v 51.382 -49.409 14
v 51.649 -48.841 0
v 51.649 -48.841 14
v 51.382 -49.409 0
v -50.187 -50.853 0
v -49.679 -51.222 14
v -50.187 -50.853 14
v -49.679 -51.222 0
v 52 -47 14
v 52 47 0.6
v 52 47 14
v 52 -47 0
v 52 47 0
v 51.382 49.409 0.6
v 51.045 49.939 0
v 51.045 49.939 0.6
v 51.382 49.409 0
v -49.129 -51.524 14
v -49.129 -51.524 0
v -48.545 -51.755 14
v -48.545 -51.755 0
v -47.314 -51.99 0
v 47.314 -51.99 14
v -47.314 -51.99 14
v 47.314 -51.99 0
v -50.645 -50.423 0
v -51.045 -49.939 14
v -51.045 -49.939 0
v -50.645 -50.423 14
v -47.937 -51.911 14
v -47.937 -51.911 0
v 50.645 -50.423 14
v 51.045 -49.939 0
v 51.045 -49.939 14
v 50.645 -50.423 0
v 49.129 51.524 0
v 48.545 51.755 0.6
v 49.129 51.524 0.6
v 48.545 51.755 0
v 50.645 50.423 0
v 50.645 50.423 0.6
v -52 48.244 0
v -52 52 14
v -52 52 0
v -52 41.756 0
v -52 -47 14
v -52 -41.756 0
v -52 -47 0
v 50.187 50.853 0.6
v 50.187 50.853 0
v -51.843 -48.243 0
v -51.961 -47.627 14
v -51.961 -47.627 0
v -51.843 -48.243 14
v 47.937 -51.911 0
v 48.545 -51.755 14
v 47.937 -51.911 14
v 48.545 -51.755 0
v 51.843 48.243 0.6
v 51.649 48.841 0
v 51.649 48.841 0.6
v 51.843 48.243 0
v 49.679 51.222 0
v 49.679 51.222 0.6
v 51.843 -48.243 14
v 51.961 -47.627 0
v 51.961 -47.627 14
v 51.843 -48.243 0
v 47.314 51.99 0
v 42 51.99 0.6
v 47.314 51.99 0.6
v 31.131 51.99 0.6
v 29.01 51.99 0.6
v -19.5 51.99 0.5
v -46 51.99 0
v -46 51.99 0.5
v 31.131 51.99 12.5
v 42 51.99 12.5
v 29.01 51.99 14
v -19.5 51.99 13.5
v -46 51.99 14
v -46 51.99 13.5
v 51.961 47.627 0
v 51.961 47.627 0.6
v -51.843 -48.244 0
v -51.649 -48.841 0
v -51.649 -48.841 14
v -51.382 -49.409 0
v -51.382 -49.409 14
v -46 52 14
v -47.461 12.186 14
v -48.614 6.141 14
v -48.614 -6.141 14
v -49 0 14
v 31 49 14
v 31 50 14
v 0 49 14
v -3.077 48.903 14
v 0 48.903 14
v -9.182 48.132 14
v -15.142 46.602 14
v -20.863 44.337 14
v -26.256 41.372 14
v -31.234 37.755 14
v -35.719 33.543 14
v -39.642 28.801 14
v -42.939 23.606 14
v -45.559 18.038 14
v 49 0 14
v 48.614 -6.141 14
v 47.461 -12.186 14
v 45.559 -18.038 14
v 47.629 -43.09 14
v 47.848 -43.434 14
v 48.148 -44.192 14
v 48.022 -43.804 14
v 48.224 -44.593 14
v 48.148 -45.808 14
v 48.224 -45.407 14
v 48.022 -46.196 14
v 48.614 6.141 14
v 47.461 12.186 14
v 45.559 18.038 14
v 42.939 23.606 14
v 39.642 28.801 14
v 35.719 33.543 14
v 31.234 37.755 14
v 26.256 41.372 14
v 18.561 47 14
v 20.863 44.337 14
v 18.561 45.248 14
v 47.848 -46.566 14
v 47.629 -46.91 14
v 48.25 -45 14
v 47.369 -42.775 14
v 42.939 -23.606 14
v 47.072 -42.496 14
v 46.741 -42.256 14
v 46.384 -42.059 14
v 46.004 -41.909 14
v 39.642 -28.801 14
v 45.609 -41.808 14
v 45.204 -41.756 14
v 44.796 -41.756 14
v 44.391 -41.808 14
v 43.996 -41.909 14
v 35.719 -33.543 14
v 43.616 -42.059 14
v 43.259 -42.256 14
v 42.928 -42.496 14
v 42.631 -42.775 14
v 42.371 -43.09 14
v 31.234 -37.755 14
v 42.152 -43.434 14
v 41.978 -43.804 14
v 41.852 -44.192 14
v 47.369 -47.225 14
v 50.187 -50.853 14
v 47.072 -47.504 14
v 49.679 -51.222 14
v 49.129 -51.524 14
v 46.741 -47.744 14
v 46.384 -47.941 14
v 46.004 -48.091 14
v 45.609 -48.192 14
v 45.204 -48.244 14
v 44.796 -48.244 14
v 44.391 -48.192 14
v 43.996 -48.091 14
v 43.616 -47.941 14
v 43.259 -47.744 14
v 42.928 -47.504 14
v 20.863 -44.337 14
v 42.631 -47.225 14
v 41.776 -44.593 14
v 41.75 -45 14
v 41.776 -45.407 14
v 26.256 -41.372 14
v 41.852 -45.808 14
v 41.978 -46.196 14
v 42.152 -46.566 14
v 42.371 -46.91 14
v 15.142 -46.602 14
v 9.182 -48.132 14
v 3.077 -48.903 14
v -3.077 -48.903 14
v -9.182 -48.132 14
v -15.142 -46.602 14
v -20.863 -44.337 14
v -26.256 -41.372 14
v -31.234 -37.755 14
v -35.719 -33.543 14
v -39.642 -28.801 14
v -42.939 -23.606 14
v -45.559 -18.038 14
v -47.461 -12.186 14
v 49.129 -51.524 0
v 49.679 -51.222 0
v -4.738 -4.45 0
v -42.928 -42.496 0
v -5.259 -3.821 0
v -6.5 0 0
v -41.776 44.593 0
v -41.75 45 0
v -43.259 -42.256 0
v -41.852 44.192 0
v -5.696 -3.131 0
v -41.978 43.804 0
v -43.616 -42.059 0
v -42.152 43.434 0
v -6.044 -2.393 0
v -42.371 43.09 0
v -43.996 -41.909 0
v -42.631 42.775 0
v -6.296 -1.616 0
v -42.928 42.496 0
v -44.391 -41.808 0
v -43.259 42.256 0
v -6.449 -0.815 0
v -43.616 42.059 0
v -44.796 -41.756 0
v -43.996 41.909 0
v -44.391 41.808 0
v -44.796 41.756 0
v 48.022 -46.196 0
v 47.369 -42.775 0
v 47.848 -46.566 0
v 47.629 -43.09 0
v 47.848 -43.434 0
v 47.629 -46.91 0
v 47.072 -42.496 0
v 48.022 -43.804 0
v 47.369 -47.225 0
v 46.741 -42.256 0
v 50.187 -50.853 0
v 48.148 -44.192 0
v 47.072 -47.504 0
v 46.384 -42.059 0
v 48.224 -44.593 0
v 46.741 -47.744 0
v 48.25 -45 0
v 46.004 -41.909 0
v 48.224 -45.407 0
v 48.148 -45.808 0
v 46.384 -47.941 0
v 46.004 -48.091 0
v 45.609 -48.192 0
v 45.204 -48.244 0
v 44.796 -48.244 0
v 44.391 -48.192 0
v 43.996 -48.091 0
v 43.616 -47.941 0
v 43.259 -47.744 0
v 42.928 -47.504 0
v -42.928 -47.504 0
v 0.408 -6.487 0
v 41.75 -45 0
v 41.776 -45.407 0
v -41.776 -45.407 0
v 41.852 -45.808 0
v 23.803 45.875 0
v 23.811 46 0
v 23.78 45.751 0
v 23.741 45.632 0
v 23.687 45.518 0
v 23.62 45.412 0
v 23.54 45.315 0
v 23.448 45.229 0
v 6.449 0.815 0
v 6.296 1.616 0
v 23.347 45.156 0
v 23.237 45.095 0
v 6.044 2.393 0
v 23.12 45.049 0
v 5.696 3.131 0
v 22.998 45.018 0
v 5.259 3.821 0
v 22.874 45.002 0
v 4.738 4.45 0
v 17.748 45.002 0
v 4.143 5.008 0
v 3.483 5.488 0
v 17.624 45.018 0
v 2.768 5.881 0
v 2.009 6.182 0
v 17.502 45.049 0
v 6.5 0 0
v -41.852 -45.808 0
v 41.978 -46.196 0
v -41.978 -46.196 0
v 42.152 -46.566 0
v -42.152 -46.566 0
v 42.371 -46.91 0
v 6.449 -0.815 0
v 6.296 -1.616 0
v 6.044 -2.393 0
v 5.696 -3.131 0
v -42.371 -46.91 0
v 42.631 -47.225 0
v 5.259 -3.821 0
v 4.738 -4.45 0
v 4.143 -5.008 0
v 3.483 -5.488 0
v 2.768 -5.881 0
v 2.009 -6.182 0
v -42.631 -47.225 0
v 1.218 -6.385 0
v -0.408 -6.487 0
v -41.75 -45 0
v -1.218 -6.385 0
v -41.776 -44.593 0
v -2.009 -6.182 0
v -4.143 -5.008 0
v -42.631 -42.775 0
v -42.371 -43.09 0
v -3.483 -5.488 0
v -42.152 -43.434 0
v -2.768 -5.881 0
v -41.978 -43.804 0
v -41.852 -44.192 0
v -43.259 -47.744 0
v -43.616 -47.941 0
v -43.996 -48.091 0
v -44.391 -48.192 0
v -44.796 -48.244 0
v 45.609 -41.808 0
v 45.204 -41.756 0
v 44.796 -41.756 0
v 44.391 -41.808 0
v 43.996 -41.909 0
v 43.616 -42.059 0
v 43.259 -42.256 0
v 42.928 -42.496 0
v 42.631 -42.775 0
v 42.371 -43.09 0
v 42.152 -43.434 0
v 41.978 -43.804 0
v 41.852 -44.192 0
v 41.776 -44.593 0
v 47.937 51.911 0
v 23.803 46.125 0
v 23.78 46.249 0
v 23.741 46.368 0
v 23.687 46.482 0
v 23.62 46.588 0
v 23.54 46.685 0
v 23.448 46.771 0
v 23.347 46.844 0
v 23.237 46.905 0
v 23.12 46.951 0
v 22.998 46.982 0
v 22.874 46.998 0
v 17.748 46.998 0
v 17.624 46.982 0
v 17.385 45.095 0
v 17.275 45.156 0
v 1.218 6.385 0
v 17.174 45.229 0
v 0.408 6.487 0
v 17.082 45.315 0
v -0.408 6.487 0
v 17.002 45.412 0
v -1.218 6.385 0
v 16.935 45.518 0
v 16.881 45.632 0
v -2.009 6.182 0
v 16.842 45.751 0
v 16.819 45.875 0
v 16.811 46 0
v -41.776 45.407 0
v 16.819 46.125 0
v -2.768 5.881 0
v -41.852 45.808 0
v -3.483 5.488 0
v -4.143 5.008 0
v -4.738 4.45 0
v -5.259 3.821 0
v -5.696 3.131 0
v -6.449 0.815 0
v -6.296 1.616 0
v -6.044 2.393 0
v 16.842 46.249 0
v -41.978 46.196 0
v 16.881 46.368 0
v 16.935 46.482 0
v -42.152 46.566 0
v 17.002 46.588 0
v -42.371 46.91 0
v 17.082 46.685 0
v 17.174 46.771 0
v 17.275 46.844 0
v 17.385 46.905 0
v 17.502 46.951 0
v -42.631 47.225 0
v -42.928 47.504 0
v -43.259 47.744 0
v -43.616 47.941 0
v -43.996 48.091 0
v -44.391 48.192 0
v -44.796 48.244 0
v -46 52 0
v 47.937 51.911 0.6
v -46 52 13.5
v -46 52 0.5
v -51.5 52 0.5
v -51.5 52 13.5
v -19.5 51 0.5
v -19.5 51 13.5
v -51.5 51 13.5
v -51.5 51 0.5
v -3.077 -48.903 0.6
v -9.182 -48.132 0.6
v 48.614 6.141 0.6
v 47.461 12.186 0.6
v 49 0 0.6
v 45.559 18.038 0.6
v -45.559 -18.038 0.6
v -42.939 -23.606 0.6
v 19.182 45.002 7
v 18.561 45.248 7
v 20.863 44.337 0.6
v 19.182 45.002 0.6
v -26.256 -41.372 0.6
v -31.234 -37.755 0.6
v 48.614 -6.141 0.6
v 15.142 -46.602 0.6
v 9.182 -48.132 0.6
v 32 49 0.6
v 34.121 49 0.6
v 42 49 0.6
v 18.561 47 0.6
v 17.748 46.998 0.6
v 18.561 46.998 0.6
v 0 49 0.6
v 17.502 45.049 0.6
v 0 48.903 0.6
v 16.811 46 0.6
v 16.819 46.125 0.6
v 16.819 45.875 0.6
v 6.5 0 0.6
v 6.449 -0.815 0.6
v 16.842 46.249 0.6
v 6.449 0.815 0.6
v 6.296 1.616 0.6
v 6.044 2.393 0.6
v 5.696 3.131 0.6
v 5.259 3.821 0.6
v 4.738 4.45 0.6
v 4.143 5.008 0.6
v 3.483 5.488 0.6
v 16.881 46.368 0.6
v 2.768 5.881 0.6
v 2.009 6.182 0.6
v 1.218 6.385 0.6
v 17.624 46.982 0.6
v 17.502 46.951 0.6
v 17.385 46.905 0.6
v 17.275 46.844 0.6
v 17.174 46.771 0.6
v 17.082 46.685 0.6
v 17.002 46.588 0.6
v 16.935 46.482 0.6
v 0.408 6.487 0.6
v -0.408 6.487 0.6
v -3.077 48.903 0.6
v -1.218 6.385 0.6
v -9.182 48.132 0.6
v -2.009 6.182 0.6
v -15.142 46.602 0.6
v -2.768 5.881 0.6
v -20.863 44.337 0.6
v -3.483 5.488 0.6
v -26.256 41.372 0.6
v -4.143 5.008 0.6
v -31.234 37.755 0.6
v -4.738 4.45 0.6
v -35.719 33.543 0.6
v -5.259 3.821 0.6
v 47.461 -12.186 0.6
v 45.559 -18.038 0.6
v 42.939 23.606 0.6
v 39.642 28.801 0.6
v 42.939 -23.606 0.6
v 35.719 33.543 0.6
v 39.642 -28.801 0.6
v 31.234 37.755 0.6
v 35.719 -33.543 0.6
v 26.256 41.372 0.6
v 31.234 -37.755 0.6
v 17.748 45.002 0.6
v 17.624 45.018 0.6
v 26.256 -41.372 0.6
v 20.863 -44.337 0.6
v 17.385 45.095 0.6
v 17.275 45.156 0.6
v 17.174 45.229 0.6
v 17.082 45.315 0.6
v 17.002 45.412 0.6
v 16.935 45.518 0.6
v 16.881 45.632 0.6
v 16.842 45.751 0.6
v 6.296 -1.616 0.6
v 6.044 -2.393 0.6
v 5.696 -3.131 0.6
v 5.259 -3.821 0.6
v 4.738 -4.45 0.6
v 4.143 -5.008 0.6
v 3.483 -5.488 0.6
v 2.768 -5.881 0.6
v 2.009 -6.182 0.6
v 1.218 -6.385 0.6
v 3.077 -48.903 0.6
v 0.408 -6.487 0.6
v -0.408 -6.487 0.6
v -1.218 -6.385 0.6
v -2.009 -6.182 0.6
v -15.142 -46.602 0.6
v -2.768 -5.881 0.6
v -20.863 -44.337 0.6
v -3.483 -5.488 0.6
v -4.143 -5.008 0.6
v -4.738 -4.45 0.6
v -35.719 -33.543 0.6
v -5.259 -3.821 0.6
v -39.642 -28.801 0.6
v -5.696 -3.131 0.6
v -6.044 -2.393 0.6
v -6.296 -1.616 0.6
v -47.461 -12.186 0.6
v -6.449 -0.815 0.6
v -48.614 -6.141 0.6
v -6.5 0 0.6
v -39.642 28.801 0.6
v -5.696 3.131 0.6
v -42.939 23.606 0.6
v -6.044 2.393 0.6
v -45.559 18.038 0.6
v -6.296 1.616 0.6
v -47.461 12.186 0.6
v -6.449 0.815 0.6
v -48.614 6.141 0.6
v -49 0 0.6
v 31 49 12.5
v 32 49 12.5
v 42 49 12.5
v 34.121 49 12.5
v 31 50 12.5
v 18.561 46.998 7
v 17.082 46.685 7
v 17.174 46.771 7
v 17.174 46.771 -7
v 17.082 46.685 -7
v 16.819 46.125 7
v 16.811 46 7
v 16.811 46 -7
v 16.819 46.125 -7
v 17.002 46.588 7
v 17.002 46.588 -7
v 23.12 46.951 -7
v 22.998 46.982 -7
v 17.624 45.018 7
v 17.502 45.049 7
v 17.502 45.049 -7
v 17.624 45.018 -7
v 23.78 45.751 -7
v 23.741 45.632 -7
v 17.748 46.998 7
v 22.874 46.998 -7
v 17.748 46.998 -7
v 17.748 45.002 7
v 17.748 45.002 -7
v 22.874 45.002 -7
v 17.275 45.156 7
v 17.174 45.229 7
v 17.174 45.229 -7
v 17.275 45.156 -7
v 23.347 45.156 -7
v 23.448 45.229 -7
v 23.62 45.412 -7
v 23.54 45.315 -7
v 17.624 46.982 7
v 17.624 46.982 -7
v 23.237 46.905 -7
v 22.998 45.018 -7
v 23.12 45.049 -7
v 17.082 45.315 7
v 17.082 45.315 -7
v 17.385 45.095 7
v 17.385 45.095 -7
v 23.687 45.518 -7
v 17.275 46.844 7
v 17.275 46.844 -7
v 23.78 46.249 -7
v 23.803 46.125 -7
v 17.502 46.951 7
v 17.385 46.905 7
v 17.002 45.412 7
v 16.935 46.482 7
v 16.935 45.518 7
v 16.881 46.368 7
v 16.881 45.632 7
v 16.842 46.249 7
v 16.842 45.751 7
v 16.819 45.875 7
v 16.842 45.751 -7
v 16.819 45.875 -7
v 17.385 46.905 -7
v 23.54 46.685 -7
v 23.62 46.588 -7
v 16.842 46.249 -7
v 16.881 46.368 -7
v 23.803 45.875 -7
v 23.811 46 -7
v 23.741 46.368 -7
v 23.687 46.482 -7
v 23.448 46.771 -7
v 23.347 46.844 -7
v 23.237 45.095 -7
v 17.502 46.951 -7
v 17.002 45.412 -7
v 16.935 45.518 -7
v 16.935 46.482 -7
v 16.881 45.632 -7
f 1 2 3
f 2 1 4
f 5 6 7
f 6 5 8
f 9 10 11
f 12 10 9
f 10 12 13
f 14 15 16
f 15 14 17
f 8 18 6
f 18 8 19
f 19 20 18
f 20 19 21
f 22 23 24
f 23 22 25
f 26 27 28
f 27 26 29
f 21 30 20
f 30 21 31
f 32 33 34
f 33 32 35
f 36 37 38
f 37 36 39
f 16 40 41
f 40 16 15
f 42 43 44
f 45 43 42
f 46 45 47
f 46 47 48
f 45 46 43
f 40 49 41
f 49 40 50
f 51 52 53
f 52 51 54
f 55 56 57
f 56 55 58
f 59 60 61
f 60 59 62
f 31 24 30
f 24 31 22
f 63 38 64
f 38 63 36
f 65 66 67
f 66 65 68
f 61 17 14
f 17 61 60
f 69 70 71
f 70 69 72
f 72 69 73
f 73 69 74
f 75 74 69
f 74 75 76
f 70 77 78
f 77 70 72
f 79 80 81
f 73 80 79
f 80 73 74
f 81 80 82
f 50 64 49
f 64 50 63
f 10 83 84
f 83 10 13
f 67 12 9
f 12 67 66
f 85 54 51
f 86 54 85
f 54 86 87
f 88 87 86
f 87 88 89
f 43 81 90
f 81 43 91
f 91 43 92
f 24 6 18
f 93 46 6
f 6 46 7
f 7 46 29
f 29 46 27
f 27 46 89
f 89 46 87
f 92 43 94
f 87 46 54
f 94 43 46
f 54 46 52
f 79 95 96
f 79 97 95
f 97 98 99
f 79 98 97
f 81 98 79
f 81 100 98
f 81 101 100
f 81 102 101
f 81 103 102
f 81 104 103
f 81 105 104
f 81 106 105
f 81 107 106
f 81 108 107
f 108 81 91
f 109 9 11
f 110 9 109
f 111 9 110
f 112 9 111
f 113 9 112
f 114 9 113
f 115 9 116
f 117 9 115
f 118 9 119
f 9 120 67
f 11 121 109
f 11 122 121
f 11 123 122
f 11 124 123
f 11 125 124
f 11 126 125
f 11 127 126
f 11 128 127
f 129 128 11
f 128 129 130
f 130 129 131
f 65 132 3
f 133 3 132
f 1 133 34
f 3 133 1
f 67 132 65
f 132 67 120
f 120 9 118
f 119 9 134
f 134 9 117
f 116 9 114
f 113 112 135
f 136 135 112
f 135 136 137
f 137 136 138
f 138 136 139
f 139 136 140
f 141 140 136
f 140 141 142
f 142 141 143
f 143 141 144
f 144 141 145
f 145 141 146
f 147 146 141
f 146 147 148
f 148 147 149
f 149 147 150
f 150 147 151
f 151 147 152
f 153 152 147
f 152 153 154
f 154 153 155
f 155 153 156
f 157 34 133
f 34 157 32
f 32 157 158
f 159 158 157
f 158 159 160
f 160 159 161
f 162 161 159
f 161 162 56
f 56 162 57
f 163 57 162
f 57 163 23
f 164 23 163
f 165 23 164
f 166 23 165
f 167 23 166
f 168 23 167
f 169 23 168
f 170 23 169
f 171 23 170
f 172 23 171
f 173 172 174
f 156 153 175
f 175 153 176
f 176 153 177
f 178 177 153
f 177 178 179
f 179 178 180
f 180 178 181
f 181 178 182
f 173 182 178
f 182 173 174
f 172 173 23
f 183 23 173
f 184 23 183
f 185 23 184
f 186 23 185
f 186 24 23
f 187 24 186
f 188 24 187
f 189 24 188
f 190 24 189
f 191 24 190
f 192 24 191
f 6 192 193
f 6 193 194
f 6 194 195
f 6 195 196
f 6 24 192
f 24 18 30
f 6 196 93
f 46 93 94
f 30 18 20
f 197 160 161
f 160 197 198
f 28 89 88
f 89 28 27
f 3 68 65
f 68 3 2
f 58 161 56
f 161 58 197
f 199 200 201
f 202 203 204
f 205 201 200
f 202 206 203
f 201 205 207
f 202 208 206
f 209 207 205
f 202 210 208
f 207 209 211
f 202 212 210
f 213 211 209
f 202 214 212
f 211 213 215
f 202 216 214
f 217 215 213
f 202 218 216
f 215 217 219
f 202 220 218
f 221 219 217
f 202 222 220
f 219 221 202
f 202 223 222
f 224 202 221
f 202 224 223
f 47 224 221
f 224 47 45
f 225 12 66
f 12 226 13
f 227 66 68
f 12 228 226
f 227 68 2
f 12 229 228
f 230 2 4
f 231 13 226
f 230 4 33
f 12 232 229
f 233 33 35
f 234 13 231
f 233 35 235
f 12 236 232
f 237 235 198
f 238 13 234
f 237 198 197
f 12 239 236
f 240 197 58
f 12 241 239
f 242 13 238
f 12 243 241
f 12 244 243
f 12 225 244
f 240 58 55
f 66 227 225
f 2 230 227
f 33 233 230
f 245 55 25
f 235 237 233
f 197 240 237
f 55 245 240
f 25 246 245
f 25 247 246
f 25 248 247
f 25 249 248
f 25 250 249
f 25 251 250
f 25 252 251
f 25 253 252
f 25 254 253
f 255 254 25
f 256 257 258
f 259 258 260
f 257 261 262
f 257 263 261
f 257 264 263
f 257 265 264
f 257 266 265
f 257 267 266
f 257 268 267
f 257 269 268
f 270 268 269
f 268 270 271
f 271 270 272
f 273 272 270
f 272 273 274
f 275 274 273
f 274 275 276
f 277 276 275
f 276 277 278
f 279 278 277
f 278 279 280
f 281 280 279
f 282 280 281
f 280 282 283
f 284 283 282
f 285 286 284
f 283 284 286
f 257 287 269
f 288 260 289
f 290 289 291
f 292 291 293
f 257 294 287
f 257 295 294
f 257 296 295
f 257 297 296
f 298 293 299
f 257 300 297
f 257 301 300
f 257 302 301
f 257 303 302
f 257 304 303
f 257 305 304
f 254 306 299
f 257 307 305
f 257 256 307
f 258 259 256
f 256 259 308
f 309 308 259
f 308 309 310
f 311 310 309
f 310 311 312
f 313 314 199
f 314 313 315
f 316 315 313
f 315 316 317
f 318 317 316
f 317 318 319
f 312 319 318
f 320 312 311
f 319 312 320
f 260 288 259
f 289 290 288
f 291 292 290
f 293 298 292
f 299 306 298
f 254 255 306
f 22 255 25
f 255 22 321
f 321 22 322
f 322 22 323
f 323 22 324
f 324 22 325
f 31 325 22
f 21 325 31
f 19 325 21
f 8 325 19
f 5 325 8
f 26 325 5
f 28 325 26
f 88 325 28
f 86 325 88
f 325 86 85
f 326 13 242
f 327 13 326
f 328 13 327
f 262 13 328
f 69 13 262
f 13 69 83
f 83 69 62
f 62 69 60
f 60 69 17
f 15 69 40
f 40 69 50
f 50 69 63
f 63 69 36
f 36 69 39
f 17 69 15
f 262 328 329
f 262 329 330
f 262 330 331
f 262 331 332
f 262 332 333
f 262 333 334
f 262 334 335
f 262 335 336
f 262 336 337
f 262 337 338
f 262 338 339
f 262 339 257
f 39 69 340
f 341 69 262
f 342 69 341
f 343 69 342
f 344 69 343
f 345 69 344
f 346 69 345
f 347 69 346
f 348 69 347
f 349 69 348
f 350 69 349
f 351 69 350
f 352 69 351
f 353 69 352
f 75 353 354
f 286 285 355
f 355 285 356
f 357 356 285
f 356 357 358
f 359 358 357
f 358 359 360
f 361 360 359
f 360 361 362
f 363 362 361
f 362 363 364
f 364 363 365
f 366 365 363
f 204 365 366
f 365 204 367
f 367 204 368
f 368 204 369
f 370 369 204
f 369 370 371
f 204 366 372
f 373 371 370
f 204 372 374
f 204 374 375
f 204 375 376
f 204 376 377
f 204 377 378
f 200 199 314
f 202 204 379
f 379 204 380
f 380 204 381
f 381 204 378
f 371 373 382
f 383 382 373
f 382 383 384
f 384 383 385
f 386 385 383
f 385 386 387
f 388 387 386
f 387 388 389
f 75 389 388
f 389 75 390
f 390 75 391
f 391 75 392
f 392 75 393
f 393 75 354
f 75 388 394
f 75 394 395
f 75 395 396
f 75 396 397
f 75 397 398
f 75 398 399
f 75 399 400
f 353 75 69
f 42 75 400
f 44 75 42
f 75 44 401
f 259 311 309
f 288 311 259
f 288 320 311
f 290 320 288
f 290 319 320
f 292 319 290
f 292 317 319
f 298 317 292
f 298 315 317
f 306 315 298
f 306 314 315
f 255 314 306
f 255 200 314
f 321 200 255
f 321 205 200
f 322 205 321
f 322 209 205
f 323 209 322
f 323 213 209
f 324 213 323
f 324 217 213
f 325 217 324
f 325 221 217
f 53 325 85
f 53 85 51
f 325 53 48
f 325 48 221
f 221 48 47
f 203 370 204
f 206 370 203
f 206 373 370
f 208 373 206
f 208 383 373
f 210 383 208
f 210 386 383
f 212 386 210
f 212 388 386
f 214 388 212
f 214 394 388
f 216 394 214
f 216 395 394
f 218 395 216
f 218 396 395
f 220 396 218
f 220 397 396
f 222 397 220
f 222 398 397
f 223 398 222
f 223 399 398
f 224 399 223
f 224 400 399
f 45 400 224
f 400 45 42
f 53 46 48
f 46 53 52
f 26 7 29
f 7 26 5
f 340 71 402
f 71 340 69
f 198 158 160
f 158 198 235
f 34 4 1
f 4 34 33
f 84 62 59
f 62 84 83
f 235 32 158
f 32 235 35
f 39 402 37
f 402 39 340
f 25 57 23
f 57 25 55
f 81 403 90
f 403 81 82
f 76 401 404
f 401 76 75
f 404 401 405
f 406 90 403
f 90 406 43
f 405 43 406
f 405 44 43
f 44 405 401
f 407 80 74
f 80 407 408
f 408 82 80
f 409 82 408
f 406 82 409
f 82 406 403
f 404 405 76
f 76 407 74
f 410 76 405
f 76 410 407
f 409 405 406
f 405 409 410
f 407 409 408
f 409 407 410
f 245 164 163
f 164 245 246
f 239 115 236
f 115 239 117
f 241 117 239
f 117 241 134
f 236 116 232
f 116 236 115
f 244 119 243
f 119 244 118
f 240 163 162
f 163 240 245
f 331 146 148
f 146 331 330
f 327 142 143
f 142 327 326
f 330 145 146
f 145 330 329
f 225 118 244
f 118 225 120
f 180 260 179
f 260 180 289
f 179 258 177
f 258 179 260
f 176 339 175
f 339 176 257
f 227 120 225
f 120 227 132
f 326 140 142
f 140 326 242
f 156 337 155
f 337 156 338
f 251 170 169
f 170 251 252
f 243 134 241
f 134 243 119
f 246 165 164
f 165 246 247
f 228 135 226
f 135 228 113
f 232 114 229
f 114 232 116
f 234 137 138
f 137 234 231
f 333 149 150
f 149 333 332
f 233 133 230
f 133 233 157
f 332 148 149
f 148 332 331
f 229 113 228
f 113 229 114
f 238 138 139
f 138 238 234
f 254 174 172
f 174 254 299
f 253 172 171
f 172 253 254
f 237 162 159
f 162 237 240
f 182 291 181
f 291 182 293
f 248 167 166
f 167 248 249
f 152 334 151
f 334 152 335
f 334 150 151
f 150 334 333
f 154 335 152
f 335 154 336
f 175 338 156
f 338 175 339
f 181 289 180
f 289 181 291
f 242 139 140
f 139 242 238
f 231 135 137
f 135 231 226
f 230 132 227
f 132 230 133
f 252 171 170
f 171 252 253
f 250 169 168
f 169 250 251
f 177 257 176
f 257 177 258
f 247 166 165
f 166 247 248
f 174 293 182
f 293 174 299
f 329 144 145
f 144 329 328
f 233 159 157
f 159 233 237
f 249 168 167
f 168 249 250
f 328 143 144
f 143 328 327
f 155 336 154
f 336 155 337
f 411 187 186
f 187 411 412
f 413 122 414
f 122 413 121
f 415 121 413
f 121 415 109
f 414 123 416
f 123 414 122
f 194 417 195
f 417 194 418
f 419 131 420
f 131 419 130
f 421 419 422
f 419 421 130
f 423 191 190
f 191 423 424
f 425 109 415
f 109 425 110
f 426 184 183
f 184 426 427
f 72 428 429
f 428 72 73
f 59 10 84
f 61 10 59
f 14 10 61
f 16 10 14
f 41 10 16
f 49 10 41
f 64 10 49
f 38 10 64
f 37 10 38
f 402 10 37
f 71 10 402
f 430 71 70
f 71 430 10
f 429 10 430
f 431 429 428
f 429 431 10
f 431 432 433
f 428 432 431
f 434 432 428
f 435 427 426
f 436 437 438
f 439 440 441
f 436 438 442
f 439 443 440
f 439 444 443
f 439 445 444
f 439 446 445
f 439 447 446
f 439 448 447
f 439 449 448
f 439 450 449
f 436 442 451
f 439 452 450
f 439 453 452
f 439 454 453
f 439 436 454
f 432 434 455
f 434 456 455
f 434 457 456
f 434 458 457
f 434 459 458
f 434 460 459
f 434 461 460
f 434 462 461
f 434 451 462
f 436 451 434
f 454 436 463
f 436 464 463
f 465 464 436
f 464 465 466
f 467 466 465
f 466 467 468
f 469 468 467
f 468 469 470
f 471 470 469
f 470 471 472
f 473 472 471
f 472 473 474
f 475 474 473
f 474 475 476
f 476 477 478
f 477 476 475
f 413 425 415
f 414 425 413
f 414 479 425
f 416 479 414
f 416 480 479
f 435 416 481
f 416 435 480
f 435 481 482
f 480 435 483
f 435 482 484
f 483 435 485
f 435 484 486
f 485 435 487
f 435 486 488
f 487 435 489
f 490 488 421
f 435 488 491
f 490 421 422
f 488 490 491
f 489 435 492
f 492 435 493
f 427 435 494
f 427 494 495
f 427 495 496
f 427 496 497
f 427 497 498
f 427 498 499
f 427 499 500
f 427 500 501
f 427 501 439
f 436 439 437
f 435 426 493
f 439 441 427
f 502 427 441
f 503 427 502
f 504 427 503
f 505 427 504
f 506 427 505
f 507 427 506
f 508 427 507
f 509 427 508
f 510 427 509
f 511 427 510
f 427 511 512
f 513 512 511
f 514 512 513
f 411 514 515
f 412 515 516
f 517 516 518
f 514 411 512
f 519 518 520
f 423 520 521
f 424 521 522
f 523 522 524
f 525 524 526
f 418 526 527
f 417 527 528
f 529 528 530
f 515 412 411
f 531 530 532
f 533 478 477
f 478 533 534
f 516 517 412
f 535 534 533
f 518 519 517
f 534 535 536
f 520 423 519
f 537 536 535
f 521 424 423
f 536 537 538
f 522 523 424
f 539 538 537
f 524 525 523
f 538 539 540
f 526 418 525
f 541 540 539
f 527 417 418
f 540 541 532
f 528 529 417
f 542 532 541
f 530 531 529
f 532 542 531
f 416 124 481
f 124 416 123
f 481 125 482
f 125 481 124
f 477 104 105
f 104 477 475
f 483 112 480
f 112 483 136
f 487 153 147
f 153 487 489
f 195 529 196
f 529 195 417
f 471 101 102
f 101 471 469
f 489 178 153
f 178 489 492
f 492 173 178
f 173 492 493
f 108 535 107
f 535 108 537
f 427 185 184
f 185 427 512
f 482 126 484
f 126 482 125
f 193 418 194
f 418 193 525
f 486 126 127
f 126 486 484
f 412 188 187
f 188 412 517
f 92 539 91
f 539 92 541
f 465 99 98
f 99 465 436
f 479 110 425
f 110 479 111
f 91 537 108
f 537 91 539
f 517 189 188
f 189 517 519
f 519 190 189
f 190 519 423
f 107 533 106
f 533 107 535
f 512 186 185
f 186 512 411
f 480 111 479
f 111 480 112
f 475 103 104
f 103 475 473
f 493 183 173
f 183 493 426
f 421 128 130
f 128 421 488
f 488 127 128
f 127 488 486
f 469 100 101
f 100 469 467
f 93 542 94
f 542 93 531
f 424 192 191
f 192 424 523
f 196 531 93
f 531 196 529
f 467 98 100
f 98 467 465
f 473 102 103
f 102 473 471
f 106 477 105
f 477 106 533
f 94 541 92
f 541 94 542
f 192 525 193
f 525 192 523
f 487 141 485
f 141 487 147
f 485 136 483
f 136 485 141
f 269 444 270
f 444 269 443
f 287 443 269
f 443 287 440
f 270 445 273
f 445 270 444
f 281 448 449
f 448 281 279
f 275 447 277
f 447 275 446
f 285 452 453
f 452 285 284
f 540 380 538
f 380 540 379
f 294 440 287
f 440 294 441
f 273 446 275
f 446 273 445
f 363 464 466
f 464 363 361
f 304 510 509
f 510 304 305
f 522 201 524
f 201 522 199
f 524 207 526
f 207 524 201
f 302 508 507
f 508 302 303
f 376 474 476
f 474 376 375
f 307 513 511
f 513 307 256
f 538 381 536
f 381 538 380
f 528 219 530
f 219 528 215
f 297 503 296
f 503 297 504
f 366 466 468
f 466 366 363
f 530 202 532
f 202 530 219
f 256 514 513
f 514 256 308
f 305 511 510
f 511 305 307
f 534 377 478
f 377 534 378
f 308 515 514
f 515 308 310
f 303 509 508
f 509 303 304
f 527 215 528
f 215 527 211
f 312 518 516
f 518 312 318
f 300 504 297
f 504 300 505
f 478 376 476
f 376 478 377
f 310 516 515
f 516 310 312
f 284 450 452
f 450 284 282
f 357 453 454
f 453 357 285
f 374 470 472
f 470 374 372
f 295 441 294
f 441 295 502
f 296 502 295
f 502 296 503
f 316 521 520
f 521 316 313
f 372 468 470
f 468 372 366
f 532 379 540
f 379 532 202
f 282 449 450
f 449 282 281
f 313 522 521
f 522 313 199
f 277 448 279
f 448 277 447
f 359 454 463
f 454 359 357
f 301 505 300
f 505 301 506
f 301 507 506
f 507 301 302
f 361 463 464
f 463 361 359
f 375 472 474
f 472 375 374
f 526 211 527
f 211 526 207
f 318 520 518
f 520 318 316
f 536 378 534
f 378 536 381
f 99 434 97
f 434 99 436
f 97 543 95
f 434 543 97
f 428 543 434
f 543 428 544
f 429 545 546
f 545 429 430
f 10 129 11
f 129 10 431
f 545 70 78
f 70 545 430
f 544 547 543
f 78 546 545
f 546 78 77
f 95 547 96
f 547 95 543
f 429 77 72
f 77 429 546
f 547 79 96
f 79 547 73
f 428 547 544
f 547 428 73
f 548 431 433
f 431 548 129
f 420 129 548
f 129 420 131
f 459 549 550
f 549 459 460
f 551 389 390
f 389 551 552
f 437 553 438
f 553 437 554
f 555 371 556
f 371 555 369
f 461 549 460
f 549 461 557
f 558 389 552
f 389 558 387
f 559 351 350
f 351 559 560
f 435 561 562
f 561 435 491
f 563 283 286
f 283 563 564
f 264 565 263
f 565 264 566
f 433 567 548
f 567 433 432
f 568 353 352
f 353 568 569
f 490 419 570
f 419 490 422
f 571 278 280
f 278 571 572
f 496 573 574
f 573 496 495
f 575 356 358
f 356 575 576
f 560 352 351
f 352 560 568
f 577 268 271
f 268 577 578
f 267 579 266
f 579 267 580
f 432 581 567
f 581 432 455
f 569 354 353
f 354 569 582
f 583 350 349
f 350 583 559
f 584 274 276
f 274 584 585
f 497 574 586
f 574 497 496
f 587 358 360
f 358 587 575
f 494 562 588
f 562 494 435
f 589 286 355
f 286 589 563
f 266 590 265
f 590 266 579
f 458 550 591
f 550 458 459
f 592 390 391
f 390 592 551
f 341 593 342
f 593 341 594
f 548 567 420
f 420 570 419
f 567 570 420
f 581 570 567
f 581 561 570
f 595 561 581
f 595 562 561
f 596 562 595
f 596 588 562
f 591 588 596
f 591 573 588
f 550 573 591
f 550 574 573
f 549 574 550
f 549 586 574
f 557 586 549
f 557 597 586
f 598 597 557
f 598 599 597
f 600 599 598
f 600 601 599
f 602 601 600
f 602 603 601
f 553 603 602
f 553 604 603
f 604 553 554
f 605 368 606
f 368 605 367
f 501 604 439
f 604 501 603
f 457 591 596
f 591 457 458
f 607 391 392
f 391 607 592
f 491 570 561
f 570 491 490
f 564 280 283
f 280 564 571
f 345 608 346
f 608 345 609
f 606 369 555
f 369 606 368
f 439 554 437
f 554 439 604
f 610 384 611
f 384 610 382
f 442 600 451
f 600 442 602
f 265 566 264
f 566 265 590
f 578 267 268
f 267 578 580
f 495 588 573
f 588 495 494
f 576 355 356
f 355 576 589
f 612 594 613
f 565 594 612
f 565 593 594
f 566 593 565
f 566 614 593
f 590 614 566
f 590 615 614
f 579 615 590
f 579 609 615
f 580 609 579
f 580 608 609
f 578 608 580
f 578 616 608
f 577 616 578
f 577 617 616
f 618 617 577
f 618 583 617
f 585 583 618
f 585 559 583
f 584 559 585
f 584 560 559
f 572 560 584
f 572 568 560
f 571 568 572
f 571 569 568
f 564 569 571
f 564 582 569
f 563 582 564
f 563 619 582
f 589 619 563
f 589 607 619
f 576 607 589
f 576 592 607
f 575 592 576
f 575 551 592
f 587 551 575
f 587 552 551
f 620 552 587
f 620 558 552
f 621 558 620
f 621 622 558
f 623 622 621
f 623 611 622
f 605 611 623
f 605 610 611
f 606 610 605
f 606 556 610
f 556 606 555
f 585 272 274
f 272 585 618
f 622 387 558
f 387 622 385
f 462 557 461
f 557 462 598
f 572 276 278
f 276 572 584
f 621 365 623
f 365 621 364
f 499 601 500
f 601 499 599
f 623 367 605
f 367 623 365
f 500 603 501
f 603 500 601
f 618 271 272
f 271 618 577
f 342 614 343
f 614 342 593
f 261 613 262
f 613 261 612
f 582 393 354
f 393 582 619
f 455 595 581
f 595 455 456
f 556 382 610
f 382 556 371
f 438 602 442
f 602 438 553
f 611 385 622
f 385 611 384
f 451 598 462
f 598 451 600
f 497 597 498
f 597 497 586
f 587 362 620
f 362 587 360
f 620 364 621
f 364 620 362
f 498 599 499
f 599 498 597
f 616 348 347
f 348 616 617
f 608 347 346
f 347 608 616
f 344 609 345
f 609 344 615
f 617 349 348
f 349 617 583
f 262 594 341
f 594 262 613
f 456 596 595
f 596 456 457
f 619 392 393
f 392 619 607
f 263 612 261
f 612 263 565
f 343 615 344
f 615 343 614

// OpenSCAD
$fn = 50;


union() {
	difference() {
		union() {
			hull() {
				translate(v = [-47.0000000000, 47.0000000000, 0]) {
					cylinder(h = 14, r = 5);
				}
				translate(v = [47.0000000000, 47.0000000000, 0]) {
					cylinder(h = 14, r = 5);
				}
				translate(v = [-47.0000000000, -47.0000000000, 0]) {
					cylinder(h = 14, r = 5);
				}
				translate(v = [47.0000000000, -47.0000000000, 0]) {
					cylinder(h = 14, r = 5);
				}
			}
			translate(v = [-52.0000000000, 46.0000000000, 0]) {
				cube(size = [6, 6, 14]);
			}
		}
		union() {
			translate(v = [-52.5000000000, -45.0000000000, -250.0000000000]) {
				rotate(a = [0, 0, 0]) {
					difference() {
						union() {
							hull() {
								translate(v = [7.5000000000, 0, 0]) {
									cylinder(h = 250, r = 3.2500000000, r1 = 3.2500000000, r2 = 3.2500000000);
								}
								translate(v = [-7.5000000000, 0, 0]) {
									cylinder(h = 250, r = 3.2500000000, r1 = 3.2500000000, r2 = 3.2500000000);
								}
							}
						}
						union();
					}
				}
			}
			translate(v = [-52.5000000000, 45.0000000000, -250.0000000000]) {
				rotate(a = [0, 0, 0]) {
					difference() {
						union() {
							hull() {
								translate(v = [7.5000000000, 0, 0]) {
									cylinder(h = 250, r = 3.2500000000, r1 = 3.2500000000, r2 = 3.2500000000);
								}
								translate(v = [-7.5000000000, 0, 0]) {
									cylinder(h = 250, r = 3.2500000000, r1 = 3.2500000000, r2 = 3.2500000000);
								}
							}
						}
						union();
					}
				}
			}
			translate(v = [-51.5000000000, 51.0000000000, 0.5000000000]) {
				cube(size = [32, 1, 13.0000000000]);
			}
			translate(v = [45.0000000000, -45.0000000000, 0]) {
				cylinder(h = 100, r = 3.2500000000);
			}
			translate(v = [0, 0, 0.6000000000]) {
				cylinder(h = 16.4000000000, r = 49.0000000000);
			}
			translate(v = [0, 0, -7.0000000000]) {
				cylinder(h = 14, r = 6.5000000000);
			}
			translate(v = [0.0000000000, 47.0000000000, 0.6000000000]) {
				cube(size = [52.0000000000, 2, 16.4000000000]);
			}
			translate(v = [42.0000000000, 47.0000000000, 0.6000000000]) {
				cube(size = [10, 5, 16.4000000000]);
			}
			translate(v = [31.0000000000, 47.0000000000, 12.5000000000]) {
				cube(size = [21, 5, 1.5000000000]);
			}
			translate(v = [28.2500000000, 52.7500000000, 0.6000000000]) {
				rotate(a = [0, 0, -45]) {
					cube(size = [7.5000000000, 1.5000000000, 16.4000000000]);
				}
			}
			translate(v = [11.0610000000, 45.0000000000, 0.6000000000]) {
				cube(size = [7.5000000000, 2, 13.4000000000]);
			}
		}
	}
	union() {
		translate(v = [20.3110000000, 46.0000000000, -7.0000000000]) {
			rotate(a = [0, 0, 0]) {
				difference() {
					union() {
						#hull() {
							#translate(v = [2.5000000000, 0, 0]) {
								cylinder(h = 14, r = 1.0000000000, r1 = 1.0000000000, r2 = 1.0000000000);
							}
							#translate(v = [-2.5000000000, 0, 0]) {
								cylinder(h = 14, r = 1.0000000000, r1 = 1.0000000000, r2 = 1.0000000000);
							}
						}
					}
					union();
				}
			}
		}
	}
}
